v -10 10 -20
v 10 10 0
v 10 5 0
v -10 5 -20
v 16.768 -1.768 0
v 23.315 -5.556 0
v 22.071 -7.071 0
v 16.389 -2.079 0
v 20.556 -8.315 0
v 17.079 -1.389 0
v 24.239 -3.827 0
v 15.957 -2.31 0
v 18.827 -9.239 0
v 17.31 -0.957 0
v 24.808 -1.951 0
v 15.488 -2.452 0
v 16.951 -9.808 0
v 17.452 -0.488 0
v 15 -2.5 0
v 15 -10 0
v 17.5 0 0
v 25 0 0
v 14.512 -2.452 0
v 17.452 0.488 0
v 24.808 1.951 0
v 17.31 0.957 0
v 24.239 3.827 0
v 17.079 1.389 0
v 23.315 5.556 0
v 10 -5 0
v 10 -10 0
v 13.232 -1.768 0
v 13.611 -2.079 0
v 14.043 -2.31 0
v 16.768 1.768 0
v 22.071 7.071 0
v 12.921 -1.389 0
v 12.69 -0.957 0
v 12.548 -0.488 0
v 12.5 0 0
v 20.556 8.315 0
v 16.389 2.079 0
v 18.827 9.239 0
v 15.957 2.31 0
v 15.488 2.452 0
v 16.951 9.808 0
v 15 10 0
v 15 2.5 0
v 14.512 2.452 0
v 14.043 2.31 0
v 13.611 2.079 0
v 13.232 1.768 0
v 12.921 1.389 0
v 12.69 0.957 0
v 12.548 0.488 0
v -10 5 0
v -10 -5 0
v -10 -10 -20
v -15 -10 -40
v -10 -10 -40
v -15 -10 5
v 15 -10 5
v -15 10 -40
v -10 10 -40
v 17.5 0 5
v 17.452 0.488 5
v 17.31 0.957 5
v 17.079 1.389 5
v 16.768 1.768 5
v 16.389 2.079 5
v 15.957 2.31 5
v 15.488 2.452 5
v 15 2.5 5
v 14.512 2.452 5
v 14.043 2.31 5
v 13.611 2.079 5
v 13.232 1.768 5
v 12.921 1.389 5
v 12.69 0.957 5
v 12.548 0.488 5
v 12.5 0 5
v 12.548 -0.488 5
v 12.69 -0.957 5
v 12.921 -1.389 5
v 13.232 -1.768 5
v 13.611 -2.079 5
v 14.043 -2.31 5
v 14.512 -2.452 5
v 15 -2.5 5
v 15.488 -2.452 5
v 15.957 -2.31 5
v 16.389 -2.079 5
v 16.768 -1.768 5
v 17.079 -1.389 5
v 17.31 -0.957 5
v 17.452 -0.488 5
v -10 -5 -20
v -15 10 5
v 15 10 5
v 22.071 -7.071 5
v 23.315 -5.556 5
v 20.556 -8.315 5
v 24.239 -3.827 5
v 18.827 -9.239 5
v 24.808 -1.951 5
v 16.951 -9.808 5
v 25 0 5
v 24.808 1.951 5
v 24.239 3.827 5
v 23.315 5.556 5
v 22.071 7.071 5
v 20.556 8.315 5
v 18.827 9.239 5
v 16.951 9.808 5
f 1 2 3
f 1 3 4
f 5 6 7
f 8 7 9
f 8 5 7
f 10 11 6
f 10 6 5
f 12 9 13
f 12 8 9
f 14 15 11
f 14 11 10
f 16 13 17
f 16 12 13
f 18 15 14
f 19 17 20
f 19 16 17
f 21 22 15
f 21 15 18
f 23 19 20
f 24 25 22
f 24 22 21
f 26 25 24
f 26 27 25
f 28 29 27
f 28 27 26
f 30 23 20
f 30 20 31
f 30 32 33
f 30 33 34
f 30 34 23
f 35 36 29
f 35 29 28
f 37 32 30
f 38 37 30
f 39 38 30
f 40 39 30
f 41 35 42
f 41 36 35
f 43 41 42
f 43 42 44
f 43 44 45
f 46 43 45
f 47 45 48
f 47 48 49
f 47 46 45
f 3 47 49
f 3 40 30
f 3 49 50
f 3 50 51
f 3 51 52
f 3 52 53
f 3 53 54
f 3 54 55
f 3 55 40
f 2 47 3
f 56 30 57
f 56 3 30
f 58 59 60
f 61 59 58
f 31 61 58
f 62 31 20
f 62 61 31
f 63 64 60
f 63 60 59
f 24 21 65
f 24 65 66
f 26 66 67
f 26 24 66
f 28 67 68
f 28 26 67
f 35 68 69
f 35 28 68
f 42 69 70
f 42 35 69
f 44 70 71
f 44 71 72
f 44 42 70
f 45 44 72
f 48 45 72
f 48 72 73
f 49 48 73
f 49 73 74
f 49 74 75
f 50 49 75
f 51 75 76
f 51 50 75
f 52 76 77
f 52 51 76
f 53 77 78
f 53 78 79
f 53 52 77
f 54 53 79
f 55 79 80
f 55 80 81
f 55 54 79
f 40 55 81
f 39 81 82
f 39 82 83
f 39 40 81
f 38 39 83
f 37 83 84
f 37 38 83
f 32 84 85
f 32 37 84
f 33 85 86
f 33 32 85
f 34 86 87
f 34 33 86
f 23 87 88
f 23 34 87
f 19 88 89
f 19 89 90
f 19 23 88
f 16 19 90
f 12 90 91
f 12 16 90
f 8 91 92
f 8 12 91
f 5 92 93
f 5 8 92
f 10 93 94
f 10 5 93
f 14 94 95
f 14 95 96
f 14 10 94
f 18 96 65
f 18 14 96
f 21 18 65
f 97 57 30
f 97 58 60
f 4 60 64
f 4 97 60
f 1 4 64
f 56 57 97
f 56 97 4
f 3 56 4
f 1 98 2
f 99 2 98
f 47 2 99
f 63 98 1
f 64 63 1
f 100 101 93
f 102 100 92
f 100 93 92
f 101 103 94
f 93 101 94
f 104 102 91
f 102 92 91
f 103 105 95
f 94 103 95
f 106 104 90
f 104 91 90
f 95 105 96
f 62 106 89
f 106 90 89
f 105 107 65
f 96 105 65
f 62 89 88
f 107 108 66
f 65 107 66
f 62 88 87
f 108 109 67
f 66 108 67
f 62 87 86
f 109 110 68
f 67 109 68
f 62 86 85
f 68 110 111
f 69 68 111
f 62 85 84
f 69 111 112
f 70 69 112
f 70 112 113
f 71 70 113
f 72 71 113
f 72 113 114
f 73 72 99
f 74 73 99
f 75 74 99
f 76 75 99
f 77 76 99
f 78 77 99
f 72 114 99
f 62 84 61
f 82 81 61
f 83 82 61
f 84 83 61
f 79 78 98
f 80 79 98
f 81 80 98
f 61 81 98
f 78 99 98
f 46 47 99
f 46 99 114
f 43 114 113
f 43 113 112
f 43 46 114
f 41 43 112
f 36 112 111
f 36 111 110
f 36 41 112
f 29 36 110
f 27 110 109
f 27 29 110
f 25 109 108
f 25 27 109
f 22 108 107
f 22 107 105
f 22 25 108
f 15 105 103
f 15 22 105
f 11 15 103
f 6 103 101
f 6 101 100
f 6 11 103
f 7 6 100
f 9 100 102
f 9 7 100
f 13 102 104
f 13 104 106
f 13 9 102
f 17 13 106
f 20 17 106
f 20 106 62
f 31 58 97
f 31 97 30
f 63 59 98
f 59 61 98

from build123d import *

# Parameters (mm, degrees)
SKETCH1_R           = 2.5
BOSS_EXTRUDE1_DEPTH = 5
SKETCH2_W           = 5
SKETCH2_H           = 20
BOSS_EXTRUDE2_DEPTH = 40
BOSS_EXTRUDE3_DEPTH = 5
BOSS_EXTRUDE4_DEPTH = 5


with BuildPart() as part:
    # Sketch1 → Boss-Extrude1 (new body)
    with BuildSketch(Plane.XY):
        with BuildLine():
            Line((-15, -10), (-15, 10))
            Line((-15, 10), (15, 10))
            ThreePointArc((15, 10), (25, 0), (15, -10))
            Line((15, -10), (-15, -10))
        make_face()
        with Locations((15, 0)):
            Circle(SKETCH1_R, mode=Mode.SUBTRACT)
    extrude(amount=BOSS_EXTRUDE1_DEPTH)

    # Sketch2 → Boss-Extrude2 (add)
    with BuildSketch(Plane(origin=(0, 0, 0), x_dir=(-1, 0, 0), z_dir=(0, 0, -1))):
        with Locations((12.5, 0)):
            Rectangle(SKETCH2_W, SKETCH2_H)
    extrude(amount=BOSS_EXTRUDE2_DEPTH)

    # Sketch4 → Boss-Extrude3 (add)
    with BuildSketch(Plane.XZ.offset(10)):
        Polygon((-10, -20), (10, 0), (-10, 0), align=None)
    extrude(amount=-BOSS_EXTRUDE3_DEPTH)

    # Sketch5 → Boss-Extrude4 (add)
    with BuildSketch(Plane(origin=(0, 10, 0), x_dir=(1, 0, 0), z_dir=(0, 1, 0))):
        Polygon((10, 0), (-10, 20), (-10, 0), align=None)
    extrude(amount=-BOSS_EXTRUDE4_DEPTH)


solid = part.part
